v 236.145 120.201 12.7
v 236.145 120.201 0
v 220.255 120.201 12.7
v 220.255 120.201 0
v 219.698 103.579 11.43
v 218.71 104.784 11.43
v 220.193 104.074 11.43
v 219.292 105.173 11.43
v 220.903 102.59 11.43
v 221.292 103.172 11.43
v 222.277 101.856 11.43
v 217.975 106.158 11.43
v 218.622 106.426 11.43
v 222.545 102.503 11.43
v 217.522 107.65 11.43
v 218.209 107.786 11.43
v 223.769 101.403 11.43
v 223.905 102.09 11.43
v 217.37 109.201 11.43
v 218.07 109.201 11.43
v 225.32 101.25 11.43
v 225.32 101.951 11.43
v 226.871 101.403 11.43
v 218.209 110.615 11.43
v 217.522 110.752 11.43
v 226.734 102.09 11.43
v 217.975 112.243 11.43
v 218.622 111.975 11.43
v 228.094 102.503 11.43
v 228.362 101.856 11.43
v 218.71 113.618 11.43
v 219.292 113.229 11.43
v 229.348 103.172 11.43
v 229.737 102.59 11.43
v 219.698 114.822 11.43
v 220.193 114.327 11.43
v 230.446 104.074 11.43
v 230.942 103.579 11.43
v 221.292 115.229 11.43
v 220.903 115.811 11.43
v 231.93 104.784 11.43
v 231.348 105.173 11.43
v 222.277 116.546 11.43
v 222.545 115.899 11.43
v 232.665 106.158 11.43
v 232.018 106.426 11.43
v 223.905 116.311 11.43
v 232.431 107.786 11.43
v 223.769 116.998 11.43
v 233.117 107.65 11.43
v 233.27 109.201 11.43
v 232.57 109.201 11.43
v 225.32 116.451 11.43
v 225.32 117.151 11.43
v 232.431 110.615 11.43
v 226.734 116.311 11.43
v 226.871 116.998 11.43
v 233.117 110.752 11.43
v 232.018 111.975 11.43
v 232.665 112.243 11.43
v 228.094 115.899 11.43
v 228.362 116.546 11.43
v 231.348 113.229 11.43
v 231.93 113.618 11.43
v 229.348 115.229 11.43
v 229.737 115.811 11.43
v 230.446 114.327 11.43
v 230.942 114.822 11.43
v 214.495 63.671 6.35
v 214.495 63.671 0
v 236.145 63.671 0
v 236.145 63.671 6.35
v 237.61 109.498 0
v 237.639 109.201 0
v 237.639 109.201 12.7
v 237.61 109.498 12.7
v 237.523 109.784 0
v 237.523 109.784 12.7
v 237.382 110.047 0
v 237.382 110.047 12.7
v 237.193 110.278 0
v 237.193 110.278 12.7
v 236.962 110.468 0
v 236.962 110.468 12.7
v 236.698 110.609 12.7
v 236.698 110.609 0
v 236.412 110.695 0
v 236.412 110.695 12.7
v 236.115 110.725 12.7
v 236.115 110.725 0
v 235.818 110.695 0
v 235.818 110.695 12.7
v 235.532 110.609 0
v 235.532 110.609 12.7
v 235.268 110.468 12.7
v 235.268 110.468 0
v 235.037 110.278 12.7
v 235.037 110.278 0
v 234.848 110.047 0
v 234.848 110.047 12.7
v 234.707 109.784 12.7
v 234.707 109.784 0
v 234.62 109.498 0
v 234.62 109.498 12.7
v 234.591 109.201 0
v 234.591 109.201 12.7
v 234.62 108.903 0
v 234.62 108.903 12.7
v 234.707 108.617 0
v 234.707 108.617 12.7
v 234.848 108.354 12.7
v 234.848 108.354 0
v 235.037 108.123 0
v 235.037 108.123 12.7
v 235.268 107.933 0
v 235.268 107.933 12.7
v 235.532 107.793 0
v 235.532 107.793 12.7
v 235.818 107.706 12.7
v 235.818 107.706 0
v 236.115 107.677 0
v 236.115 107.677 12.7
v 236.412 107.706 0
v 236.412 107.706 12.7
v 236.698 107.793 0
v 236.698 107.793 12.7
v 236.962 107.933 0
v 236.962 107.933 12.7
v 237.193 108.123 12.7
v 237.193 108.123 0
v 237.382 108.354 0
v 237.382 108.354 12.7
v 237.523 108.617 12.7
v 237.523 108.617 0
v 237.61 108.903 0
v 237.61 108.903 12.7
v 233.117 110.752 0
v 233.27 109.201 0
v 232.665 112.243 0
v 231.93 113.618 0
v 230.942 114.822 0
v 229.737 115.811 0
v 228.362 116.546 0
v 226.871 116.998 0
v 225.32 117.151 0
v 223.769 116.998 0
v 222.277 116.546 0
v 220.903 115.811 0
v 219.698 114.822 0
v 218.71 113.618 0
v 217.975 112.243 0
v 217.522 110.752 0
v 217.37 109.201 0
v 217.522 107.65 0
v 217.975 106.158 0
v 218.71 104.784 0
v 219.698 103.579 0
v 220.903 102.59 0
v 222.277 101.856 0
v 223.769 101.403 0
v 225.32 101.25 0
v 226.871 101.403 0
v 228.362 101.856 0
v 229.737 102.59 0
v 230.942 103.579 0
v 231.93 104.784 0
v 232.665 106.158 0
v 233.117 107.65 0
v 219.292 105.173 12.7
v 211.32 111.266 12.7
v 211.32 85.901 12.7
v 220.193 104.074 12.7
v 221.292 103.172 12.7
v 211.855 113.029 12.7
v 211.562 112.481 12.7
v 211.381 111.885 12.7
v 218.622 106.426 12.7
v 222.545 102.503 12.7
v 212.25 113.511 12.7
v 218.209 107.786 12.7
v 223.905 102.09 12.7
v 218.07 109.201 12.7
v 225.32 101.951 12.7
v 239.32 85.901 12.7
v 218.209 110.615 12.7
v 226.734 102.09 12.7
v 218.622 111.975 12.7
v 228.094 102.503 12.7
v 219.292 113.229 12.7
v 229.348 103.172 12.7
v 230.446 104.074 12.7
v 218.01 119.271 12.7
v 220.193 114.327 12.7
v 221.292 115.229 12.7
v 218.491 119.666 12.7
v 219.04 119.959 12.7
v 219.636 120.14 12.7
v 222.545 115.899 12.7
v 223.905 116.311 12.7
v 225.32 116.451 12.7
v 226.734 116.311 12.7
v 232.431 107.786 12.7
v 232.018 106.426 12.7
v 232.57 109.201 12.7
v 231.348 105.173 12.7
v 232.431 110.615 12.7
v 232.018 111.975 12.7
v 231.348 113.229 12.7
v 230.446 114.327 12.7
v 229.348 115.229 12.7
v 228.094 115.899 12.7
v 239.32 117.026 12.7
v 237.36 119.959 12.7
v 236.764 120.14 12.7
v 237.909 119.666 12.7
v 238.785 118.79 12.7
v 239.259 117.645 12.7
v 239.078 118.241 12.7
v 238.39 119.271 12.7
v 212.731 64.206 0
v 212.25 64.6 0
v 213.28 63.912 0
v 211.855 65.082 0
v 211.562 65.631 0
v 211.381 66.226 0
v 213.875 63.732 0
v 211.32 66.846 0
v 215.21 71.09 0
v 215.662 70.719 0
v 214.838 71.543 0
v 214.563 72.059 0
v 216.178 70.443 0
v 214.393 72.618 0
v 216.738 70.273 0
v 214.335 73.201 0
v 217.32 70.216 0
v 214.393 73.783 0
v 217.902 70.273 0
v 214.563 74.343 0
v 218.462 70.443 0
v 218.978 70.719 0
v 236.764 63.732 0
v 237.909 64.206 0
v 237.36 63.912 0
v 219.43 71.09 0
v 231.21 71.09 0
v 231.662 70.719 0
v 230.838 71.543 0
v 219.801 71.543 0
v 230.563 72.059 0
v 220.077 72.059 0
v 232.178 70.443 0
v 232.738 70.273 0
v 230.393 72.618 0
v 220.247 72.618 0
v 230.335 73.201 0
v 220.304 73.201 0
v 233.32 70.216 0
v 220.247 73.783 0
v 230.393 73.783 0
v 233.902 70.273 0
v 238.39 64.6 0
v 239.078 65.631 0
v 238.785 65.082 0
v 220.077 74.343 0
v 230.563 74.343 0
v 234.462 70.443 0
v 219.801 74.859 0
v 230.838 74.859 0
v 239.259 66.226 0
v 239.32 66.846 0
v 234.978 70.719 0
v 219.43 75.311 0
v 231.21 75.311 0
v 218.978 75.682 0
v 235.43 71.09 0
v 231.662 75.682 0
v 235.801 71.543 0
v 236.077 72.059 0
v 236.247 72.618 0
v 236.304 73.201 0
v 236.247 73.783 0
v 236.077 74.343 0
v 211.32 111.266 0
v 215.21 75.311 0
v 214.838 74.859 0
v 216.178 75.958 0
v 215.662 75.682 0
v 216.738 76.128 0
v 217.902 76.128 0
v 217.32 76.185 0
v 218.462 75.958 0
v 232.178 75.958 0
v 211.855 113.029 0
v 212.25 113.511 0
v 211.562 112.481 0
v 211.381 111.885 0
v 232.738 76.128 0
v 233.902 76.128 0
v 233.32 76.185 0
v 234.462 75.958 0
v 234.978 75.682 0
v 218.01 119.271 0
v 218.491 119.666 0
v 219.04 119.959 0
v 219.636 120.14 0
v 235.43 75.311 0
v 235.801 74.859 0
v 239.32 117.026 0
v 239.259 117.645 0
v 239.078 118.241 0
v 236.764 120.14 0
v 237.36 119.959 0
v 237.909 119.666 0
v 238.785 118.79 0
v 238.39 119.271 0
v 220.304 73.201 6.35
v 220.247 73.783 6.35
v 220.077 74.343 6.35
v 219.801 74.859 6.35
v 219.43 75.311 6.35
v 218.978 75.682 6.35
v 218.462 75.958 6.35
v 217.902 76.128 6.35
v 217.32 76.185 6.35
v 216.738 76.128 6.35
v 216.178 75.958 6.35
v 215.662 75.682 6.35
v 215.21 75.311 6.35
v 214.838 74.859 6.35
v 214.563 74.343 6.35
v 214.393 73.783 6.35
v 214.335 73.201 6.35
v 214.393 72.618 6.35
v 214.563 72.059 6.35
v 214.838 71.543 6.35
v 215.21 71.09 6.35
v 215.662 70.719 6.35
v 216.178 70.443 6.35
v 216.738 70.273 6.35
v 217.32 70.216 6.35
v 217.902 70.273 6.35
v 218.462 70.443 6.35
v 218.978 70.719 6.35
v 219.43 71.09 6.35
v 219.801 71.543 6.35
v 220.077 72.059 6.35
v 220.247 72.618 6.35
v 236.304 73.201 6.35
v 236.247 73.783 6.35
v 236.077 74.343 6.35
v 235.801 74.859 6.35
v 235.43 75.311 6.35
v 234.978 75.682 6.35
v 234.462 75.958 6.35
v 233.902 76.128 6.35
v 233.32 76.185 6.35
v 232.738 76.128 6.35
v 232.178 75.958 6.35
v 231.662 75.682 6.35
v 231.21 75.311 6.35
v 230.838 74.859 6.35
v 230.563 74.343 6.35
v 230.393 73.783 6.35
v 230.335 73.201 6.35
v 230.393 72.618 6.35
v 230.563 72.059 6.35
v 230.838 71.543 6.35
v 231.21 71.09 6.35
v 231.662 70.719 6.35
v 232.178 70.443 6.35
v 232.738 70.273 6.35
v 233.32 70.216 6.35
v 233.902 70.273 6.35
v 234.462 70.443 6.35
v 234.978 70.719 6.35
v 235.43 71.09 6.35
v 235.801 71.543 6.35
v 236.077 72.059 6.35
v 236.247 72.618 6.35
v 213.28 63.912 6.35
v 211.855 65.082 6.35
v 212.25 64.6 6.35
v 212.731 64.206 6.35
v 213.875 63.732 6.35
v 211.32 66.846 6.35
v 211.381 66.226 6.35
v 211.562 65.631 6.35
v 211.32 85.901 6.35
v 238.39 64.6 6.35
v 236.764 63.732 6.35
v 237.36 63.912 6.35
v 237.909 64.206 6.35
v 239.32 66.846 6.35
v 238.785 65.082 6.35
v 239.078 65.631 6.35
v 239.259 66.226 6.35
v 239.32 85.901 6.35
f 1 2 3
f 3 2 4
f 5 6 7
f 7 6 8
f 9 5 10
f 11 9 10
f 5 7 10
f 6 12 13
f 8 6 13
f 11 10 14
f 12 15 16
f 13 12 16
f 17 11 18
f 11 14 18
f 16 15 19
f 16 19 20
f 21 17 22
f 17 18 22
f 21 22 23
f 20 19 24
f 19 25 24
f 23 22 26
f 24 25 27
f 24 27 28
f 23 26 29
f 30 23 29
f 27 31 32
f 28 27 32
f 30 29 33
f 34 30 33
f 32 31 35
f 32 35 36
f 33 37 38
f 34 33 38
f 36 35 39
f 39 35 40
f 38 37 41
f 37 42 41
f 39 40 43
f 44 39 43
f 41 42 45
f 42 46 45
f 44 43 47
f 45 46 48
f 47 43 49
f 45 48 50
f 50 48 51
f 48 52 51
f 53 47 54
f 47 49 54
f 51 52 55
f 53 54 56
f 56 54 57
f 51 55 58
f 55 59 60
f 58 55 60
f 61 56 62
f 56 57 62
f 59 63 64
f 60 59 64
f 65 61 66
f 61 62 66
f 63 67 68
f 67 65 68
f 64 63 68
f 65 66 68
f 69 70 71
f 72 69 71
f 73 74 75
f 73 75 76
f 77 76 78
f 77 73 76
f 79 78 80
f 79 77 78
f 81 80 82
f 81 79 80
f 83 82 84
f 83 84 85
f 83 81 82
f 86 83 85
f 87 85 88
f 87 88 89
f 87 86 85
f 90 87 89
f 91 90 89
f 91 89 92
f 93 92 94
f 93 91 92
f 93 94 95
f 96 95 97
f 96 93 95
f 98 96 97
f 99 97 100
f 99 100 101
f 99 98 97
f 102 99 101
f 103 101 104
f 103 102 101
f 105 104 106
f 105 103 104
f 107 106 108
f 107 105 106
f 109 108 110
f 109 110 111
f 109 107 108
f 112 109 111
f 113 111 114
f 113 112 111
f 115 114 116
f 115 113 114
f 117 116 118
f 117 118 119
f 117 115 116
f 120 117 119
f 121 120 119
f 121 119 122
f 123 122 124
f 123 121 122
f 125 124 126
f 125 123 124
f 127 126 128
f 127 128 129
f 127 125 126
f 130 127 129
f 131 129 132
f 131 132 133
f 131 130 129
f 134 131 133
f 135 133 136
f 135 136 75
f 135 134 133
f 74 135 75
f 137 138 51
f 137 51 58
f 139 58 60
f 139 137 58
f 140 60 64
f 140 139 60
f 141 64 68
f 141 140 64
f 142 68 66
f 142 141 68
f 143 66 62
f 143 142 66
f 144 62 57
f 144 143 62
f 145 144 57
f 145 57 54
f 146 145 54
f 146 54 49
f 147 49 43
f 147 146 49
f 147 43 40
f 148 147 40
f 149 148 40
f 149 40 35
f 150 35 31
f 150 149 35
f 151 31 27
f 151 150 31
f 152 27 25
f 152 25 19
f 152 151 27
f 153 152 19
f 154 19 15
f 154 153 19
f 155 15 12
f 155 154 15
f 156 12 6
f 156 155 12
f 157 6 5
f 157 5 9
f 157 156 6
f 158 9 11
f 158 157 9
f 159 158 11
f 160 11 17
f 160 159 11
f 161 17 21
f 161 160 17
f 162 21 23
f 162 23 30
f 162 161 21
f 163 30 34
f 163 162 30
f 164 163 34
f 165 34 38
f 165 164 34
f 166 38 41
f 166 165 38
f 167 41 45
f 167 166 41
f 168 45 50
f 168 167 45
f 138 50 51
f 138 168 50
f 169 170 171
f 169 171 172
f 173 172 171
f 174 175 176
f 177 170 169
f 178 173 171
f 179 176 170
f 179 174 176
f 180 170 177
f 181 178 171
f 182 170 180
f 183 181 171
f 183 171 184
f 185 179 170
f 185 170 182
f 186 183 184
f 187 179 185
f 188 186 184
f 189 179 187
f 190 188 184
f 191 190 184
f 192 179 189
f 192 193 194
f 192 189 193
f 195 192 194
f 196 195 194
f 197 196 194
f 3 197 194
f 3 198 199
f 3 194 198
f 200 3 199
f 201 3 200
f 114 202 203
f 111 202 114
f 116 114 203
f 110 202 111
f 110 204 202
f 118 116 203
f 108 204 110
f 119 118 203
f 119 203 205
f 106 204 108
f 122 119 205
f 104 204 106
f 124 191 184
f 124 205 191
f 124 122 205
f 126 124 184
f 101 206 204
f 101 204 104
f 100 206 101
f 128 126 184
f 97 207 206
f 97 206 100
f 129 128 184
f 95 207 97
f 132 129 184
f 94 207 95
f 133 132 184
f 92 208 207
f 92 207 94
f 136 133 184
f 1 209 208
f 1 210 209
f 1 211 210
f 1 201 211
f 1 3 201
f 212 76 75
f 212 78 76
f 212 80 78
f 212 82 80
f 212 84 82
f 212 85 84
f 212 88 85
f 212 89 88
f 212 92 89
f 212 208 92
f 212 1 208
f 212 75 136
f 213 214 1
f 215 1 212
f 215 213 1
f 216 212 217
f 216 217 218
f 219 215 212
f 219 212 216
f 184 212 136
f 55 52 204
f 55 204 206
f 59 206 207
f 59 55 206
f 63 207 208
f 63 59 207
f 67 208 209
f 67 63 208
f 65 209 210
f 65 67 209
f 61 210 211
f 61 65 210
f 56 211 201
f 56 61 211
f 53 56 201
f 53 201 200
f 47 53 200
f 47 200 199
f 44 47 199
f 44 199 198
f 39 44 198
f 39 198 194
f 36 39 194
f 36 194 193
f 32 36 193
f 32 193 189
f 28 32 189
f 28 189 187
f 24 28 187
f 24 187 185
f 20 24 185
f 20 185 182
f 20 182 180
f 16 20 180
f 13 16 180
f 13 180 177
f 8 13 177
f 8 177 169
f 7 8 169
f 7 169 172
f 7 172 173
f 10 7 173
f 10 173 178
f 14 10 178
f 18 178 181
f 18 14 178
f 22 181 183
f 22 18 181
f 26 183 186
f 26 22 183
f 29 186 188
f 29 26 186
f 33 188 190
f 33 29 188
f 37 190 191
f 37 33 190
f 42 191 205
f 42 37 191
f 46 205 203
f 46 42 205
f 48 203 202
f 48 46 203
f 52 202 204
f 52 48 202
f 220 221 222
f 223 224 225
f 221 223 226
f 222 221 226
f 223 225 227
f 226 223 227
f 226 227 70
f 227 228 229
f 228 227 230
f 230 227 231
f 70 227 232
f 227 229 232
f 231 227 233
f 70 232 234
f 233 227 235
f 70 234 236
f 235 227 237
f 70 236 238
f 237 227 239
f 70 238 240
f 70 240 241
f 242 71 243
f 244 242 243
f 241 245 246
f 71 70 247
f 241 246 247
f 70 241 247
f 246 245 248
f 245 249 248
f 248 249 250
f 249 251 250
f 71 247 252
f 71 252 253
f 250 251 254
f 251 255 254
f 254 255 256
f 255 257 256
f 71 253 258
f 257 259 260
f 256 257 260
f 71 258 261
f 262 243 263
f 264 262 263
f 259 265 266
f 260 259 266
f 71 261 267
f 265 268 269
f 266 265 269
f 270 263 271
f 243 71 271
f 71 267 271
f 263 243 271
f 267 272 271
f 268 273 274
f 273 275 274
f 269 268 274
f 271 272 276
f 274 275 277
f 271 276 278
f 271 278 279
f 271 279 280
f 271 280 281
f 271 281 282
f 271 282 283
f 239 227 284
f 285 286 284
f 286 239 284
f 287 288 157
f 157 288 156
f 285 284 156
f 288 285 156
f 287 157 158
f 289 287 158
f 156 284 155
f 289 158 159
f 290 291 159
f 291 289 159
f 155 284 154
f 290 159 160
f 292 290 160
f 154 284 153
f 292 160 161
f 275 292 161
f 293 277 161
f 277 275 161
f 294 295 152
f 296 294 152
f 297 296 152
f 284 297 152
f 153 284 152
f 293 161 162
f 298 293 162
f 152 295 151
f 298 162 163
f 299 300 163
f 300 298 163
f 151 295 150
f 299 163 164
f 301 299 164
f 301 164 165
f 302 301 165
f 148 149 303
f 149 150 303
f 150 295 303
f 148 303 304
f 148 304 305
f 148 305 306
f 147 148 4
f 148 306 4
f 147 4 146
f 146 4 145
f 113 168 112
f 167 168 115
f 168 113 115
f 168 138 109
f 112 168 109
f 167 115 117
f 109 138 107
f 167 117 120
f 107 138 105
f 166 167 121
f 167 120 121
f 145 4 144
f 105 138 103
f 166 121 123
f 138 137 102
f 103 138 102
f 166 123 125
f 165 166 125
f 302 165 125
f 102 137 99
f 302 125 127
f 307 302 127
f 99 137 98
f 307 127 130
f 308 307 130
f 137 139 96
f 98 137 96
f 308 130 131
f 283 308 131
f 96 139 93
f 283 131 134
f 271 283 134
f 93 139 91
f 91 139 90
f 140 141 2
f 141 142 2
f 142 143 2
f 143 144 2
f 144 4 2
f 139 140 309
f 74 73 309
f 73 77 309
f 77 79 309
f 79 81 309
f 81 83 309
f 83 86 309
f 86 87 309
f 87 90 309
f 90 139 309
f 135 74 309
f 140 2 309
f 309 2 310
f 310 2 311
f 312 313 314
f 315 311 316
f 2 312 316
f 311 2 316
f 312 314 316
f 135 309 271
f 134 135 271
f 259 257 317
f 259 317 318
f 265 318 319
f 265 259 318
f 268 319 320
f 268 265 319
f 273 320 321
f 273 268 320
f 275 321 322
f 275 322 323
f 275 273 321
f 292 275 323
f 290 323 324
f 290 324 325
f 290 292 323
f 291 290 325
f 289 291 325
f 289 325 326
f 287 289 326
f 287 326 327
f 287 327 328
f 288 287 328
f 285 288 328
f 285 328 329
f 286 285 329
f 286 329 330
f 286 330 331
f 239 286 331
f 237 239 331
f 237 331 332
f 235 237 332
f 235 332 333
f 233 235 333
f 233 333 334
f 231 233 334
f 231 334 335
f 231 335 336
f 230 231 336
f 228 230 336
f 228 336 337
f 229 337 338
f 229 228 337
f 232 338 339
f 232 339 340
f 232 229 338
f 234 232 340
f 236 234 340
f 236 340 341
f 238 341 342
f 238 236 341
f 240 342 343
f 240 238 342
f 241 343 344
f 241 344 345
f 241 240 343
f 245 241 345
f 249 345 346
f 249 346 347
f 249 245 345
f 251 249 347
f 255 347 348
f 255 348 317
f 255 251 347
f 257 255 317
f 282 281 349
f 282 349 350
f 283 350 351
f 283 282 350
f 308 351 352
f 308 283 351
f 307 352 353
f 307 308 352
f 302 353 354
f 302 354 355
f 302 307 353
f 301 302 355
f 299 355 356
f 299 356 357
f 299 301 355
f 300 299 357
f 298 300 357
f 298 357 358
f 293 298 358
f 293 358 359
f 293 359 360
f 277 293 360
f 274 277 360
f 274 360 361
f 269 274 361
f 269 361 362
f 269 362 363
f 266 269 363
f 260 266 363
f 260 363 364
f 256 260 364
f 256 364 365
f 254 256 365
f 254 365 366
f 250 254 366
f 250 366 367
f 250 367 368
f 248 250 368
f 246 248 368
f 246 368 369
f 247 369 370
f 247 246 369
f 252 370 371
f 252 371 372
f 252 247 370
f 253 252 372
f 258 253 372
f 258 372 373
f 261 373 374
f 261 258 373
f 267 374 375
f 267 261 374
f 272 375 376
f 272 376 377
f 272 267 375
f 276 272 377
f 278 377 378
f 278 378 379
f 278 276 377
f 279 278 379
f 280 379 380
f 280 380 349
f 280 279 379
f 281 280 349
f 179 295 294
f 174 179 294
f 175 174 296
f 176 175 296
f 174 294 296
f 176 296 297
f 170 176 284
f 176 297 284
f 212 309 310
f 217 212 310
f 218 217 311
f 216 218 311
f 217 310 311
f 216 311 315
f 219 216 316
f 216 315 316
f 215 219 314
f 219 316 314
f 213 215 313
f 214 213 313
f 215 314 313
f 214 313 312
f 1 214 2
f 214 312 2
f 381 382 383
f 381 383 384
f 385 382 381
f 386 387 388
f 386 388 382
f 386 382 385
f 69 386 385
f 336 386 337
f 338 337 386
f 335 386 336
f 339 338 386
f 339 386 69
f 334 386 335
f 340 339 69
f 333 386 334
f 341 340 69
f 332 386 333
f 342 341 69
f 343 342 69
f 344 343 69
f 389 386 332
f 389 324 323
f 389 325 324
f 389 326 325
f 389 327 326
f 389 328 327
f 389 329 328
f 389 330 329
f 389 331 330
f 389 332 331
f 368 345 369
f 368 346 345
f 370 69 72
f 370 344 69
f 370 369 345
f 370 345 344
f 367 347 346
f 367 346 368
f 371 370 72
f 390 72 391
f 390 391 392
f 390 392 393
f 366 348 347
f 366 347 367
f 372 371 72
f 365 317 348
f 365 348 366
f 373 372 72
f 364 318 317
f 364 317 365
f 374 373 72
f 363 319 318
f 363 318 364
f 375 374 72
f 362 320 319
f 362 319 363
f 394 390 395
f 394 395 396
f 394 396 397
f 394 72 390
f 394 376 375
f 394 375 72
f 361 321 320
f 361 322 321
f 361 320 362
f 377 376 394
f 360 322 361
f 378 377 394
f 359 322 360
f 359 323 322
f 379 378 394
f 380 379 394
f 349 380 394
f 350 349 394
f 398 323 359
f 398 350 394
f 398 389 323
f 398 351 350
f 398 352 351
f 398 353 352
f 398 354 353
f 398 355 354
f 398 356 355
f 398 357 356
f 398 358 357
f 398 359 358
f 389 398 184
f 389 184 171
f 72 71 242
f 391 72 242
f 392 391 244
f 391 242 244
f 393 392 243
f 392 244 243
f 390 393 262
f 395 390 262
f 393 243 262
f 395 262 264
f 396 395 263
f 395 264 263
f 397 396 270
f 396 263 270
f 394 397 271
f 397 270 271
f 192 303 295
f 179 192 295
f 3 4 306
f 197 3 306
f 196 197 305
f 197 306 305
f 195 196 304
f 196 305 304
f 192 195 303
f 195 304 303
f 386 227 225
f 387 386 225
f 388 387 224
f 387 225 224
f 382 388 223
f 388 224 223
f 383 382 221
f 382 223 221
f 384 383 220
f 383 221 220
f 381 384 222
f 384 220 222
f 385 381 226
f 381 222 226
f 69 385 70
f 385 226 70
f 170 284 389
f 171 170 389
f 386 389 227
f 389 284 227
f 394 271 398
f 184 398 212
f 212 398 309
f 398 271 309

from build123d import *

# Parameters (mm, degrees)
SKETCH1_R           = 2.9845
SKETCH1_R_2         = 7.9502
SKETCH1_R_3         = 1.524
SKETCH1_R_4         = 7.250000001
BOSS_EXTRUDE1_DEPTH = 12.7
SKETCH1_3_R         = 7.9502
SKETCH1_3_R_2       = 7.250000001
CUT_EXTRUDE1_DEPTH  = 11.43
CUT_EXTRUDE2_START  = 6.35
SKETCH1_4_R         = 2.9845
CUT_EXTRUDE2_DEPTH  = 6.35


with BuildPart() as part:
    # Sketch1 → Boss-Extrude1 (new body)
    # profile 1 of 3: a face of its own
    with BuildSketch(Plane.XY):
        with BuildLine():
            ThreePointArc((211.319871652, 66.845549451), (212.249807622, 64.60048542), (214.494871652, 63.670549451))
            Line((214.494871652, 63.670549451), (236.144871651, 63.670549451))
            ThreePointArc((236.144871651, 63.670549451), (238.389935682, 64.60048542), (239.319871651, 66.845549451))
            Line((239.319871651, 66.845549451), (239.319871651, 85.900629451))
            Line((239.319871651, 85.900629451), (211.319871652, 85.900629451))
            Line((211.319871652, 85.900629451), (211.319871652, 66.845549451))
        make_face()
        with Locations((217.319871651, 73.200629451)):
            Circle(SKETCH1_R, mode=Mode.SUBTRACT)
        with Locations((233.319871652, 73.200629451)):
            Circle(SKETCH1_R, mode=Mode.SUBTRACT)
    # profile 2 of 3: a face of its own
    with BuildSketch(Plane.XY):
        with BuildLine():
            Line((211.319871652, 111.26550139), (211.319871652, 85.900629451))
            Line((211.319871652, 85.900629451), (239.319871651, 85.900629451))
            Line((239.319871651, 85.900629451), (239.319871651, 117.025629451))
            ThreePointArc((239.319871651, 117.025629451), (238.389935682, 119.270693481), (236.144871651, 120.200629451))
            Line((236.144871651, 120.200629451), (220.254999713, 120.200629451))
            ThreePointArc((220.254999713, 120.200629451), (219.039979814, 119.958946966), (218.009935681, 119.27069348))
            Line((218.009935681, 119.27069348), (212.24980762, 113.510565419))
            ThreePointArc((212.24980762, 113.510565419), (211.561554136, 112.480521287), (211.319871652, 111.26550139))
        make_face()
        with Locations((225.31987165, 109.200629449)):
            Circle(SKETCH1_R_2, mode=Mode.SUBTRACT)
        with Locations((236.11487165, 109.200629449)):
            Circle(SKETCH1_R_3, mode=Mode.SUBTRACT)
    # profile 3 of 3: a face of its own
    with BuildSketch(Plane.XY):
        with Locations((225.31987165, 109.200629449)):
            Circle(SKETCH1_R_2)
        with Locations((225.31987165, 109.200629449)):
            Circle(SKETCH1_R_4, mode=Mode.SUBTRACT)
    extrude(amount=BOSS_EXTRUDE1_DEPTH)

    # Sketch1<3> → Cut-Extrude1 (cut)
    with BuildSketch(Plane.XY):
        with Locations((225.31987165, 109.200629449)):
            Circle(SKETCH1_3_R)
        with Locations((225.31987165, 109.200629449)):
            Circle(SKETCH1_3_R_2, mode=Mode.SUBTRACT)
    extrude(amount=CUT_EXTRUDE1_DEPTH, mode=Mode.SUBTRACT)

    # Sketch1<4> → Cut-Extrude2 (cut)
    with BuildSketch(Plane.XY.offset(CUT_EXTRUDE2_START)):
        with BuildLine():
            ThreePointArc((211.319871652, 66.845549451), (212.249807622, 64.60048542), (214.494871652, 63.670549451))
            Line((214.494871652, 63.670549451), (236.144871651, 63.670549451))
            ThreePointArc((236.144871651, 63.670549451), (238.389935682, 64.60048542), (239.319871651, 66.845549451))
            Line((239.319871651, 66.845549451), (239.319871651, 85.900629451))
            Line((239.319871651, 85.900629451), (211.319871652, 85.900629451))
            Line((211.319871652, 85.900629451), (211.319871652, 66.845549451))
        make_face()
        with Locations((217.319871651, 73.200629451)):
            Circle(SKETCH1_4_R, mode=Mode.SUBTRACT)
        with Locations((233.319871652, 73.200629451)):
            Circle(SKETCH1_4_R, mode=Mode.SUBTRACT)
    extrude(amount=CUT_EXTRUDE2_DEPTH, mode=Mode.SUBTRACT)


solid = part.part
